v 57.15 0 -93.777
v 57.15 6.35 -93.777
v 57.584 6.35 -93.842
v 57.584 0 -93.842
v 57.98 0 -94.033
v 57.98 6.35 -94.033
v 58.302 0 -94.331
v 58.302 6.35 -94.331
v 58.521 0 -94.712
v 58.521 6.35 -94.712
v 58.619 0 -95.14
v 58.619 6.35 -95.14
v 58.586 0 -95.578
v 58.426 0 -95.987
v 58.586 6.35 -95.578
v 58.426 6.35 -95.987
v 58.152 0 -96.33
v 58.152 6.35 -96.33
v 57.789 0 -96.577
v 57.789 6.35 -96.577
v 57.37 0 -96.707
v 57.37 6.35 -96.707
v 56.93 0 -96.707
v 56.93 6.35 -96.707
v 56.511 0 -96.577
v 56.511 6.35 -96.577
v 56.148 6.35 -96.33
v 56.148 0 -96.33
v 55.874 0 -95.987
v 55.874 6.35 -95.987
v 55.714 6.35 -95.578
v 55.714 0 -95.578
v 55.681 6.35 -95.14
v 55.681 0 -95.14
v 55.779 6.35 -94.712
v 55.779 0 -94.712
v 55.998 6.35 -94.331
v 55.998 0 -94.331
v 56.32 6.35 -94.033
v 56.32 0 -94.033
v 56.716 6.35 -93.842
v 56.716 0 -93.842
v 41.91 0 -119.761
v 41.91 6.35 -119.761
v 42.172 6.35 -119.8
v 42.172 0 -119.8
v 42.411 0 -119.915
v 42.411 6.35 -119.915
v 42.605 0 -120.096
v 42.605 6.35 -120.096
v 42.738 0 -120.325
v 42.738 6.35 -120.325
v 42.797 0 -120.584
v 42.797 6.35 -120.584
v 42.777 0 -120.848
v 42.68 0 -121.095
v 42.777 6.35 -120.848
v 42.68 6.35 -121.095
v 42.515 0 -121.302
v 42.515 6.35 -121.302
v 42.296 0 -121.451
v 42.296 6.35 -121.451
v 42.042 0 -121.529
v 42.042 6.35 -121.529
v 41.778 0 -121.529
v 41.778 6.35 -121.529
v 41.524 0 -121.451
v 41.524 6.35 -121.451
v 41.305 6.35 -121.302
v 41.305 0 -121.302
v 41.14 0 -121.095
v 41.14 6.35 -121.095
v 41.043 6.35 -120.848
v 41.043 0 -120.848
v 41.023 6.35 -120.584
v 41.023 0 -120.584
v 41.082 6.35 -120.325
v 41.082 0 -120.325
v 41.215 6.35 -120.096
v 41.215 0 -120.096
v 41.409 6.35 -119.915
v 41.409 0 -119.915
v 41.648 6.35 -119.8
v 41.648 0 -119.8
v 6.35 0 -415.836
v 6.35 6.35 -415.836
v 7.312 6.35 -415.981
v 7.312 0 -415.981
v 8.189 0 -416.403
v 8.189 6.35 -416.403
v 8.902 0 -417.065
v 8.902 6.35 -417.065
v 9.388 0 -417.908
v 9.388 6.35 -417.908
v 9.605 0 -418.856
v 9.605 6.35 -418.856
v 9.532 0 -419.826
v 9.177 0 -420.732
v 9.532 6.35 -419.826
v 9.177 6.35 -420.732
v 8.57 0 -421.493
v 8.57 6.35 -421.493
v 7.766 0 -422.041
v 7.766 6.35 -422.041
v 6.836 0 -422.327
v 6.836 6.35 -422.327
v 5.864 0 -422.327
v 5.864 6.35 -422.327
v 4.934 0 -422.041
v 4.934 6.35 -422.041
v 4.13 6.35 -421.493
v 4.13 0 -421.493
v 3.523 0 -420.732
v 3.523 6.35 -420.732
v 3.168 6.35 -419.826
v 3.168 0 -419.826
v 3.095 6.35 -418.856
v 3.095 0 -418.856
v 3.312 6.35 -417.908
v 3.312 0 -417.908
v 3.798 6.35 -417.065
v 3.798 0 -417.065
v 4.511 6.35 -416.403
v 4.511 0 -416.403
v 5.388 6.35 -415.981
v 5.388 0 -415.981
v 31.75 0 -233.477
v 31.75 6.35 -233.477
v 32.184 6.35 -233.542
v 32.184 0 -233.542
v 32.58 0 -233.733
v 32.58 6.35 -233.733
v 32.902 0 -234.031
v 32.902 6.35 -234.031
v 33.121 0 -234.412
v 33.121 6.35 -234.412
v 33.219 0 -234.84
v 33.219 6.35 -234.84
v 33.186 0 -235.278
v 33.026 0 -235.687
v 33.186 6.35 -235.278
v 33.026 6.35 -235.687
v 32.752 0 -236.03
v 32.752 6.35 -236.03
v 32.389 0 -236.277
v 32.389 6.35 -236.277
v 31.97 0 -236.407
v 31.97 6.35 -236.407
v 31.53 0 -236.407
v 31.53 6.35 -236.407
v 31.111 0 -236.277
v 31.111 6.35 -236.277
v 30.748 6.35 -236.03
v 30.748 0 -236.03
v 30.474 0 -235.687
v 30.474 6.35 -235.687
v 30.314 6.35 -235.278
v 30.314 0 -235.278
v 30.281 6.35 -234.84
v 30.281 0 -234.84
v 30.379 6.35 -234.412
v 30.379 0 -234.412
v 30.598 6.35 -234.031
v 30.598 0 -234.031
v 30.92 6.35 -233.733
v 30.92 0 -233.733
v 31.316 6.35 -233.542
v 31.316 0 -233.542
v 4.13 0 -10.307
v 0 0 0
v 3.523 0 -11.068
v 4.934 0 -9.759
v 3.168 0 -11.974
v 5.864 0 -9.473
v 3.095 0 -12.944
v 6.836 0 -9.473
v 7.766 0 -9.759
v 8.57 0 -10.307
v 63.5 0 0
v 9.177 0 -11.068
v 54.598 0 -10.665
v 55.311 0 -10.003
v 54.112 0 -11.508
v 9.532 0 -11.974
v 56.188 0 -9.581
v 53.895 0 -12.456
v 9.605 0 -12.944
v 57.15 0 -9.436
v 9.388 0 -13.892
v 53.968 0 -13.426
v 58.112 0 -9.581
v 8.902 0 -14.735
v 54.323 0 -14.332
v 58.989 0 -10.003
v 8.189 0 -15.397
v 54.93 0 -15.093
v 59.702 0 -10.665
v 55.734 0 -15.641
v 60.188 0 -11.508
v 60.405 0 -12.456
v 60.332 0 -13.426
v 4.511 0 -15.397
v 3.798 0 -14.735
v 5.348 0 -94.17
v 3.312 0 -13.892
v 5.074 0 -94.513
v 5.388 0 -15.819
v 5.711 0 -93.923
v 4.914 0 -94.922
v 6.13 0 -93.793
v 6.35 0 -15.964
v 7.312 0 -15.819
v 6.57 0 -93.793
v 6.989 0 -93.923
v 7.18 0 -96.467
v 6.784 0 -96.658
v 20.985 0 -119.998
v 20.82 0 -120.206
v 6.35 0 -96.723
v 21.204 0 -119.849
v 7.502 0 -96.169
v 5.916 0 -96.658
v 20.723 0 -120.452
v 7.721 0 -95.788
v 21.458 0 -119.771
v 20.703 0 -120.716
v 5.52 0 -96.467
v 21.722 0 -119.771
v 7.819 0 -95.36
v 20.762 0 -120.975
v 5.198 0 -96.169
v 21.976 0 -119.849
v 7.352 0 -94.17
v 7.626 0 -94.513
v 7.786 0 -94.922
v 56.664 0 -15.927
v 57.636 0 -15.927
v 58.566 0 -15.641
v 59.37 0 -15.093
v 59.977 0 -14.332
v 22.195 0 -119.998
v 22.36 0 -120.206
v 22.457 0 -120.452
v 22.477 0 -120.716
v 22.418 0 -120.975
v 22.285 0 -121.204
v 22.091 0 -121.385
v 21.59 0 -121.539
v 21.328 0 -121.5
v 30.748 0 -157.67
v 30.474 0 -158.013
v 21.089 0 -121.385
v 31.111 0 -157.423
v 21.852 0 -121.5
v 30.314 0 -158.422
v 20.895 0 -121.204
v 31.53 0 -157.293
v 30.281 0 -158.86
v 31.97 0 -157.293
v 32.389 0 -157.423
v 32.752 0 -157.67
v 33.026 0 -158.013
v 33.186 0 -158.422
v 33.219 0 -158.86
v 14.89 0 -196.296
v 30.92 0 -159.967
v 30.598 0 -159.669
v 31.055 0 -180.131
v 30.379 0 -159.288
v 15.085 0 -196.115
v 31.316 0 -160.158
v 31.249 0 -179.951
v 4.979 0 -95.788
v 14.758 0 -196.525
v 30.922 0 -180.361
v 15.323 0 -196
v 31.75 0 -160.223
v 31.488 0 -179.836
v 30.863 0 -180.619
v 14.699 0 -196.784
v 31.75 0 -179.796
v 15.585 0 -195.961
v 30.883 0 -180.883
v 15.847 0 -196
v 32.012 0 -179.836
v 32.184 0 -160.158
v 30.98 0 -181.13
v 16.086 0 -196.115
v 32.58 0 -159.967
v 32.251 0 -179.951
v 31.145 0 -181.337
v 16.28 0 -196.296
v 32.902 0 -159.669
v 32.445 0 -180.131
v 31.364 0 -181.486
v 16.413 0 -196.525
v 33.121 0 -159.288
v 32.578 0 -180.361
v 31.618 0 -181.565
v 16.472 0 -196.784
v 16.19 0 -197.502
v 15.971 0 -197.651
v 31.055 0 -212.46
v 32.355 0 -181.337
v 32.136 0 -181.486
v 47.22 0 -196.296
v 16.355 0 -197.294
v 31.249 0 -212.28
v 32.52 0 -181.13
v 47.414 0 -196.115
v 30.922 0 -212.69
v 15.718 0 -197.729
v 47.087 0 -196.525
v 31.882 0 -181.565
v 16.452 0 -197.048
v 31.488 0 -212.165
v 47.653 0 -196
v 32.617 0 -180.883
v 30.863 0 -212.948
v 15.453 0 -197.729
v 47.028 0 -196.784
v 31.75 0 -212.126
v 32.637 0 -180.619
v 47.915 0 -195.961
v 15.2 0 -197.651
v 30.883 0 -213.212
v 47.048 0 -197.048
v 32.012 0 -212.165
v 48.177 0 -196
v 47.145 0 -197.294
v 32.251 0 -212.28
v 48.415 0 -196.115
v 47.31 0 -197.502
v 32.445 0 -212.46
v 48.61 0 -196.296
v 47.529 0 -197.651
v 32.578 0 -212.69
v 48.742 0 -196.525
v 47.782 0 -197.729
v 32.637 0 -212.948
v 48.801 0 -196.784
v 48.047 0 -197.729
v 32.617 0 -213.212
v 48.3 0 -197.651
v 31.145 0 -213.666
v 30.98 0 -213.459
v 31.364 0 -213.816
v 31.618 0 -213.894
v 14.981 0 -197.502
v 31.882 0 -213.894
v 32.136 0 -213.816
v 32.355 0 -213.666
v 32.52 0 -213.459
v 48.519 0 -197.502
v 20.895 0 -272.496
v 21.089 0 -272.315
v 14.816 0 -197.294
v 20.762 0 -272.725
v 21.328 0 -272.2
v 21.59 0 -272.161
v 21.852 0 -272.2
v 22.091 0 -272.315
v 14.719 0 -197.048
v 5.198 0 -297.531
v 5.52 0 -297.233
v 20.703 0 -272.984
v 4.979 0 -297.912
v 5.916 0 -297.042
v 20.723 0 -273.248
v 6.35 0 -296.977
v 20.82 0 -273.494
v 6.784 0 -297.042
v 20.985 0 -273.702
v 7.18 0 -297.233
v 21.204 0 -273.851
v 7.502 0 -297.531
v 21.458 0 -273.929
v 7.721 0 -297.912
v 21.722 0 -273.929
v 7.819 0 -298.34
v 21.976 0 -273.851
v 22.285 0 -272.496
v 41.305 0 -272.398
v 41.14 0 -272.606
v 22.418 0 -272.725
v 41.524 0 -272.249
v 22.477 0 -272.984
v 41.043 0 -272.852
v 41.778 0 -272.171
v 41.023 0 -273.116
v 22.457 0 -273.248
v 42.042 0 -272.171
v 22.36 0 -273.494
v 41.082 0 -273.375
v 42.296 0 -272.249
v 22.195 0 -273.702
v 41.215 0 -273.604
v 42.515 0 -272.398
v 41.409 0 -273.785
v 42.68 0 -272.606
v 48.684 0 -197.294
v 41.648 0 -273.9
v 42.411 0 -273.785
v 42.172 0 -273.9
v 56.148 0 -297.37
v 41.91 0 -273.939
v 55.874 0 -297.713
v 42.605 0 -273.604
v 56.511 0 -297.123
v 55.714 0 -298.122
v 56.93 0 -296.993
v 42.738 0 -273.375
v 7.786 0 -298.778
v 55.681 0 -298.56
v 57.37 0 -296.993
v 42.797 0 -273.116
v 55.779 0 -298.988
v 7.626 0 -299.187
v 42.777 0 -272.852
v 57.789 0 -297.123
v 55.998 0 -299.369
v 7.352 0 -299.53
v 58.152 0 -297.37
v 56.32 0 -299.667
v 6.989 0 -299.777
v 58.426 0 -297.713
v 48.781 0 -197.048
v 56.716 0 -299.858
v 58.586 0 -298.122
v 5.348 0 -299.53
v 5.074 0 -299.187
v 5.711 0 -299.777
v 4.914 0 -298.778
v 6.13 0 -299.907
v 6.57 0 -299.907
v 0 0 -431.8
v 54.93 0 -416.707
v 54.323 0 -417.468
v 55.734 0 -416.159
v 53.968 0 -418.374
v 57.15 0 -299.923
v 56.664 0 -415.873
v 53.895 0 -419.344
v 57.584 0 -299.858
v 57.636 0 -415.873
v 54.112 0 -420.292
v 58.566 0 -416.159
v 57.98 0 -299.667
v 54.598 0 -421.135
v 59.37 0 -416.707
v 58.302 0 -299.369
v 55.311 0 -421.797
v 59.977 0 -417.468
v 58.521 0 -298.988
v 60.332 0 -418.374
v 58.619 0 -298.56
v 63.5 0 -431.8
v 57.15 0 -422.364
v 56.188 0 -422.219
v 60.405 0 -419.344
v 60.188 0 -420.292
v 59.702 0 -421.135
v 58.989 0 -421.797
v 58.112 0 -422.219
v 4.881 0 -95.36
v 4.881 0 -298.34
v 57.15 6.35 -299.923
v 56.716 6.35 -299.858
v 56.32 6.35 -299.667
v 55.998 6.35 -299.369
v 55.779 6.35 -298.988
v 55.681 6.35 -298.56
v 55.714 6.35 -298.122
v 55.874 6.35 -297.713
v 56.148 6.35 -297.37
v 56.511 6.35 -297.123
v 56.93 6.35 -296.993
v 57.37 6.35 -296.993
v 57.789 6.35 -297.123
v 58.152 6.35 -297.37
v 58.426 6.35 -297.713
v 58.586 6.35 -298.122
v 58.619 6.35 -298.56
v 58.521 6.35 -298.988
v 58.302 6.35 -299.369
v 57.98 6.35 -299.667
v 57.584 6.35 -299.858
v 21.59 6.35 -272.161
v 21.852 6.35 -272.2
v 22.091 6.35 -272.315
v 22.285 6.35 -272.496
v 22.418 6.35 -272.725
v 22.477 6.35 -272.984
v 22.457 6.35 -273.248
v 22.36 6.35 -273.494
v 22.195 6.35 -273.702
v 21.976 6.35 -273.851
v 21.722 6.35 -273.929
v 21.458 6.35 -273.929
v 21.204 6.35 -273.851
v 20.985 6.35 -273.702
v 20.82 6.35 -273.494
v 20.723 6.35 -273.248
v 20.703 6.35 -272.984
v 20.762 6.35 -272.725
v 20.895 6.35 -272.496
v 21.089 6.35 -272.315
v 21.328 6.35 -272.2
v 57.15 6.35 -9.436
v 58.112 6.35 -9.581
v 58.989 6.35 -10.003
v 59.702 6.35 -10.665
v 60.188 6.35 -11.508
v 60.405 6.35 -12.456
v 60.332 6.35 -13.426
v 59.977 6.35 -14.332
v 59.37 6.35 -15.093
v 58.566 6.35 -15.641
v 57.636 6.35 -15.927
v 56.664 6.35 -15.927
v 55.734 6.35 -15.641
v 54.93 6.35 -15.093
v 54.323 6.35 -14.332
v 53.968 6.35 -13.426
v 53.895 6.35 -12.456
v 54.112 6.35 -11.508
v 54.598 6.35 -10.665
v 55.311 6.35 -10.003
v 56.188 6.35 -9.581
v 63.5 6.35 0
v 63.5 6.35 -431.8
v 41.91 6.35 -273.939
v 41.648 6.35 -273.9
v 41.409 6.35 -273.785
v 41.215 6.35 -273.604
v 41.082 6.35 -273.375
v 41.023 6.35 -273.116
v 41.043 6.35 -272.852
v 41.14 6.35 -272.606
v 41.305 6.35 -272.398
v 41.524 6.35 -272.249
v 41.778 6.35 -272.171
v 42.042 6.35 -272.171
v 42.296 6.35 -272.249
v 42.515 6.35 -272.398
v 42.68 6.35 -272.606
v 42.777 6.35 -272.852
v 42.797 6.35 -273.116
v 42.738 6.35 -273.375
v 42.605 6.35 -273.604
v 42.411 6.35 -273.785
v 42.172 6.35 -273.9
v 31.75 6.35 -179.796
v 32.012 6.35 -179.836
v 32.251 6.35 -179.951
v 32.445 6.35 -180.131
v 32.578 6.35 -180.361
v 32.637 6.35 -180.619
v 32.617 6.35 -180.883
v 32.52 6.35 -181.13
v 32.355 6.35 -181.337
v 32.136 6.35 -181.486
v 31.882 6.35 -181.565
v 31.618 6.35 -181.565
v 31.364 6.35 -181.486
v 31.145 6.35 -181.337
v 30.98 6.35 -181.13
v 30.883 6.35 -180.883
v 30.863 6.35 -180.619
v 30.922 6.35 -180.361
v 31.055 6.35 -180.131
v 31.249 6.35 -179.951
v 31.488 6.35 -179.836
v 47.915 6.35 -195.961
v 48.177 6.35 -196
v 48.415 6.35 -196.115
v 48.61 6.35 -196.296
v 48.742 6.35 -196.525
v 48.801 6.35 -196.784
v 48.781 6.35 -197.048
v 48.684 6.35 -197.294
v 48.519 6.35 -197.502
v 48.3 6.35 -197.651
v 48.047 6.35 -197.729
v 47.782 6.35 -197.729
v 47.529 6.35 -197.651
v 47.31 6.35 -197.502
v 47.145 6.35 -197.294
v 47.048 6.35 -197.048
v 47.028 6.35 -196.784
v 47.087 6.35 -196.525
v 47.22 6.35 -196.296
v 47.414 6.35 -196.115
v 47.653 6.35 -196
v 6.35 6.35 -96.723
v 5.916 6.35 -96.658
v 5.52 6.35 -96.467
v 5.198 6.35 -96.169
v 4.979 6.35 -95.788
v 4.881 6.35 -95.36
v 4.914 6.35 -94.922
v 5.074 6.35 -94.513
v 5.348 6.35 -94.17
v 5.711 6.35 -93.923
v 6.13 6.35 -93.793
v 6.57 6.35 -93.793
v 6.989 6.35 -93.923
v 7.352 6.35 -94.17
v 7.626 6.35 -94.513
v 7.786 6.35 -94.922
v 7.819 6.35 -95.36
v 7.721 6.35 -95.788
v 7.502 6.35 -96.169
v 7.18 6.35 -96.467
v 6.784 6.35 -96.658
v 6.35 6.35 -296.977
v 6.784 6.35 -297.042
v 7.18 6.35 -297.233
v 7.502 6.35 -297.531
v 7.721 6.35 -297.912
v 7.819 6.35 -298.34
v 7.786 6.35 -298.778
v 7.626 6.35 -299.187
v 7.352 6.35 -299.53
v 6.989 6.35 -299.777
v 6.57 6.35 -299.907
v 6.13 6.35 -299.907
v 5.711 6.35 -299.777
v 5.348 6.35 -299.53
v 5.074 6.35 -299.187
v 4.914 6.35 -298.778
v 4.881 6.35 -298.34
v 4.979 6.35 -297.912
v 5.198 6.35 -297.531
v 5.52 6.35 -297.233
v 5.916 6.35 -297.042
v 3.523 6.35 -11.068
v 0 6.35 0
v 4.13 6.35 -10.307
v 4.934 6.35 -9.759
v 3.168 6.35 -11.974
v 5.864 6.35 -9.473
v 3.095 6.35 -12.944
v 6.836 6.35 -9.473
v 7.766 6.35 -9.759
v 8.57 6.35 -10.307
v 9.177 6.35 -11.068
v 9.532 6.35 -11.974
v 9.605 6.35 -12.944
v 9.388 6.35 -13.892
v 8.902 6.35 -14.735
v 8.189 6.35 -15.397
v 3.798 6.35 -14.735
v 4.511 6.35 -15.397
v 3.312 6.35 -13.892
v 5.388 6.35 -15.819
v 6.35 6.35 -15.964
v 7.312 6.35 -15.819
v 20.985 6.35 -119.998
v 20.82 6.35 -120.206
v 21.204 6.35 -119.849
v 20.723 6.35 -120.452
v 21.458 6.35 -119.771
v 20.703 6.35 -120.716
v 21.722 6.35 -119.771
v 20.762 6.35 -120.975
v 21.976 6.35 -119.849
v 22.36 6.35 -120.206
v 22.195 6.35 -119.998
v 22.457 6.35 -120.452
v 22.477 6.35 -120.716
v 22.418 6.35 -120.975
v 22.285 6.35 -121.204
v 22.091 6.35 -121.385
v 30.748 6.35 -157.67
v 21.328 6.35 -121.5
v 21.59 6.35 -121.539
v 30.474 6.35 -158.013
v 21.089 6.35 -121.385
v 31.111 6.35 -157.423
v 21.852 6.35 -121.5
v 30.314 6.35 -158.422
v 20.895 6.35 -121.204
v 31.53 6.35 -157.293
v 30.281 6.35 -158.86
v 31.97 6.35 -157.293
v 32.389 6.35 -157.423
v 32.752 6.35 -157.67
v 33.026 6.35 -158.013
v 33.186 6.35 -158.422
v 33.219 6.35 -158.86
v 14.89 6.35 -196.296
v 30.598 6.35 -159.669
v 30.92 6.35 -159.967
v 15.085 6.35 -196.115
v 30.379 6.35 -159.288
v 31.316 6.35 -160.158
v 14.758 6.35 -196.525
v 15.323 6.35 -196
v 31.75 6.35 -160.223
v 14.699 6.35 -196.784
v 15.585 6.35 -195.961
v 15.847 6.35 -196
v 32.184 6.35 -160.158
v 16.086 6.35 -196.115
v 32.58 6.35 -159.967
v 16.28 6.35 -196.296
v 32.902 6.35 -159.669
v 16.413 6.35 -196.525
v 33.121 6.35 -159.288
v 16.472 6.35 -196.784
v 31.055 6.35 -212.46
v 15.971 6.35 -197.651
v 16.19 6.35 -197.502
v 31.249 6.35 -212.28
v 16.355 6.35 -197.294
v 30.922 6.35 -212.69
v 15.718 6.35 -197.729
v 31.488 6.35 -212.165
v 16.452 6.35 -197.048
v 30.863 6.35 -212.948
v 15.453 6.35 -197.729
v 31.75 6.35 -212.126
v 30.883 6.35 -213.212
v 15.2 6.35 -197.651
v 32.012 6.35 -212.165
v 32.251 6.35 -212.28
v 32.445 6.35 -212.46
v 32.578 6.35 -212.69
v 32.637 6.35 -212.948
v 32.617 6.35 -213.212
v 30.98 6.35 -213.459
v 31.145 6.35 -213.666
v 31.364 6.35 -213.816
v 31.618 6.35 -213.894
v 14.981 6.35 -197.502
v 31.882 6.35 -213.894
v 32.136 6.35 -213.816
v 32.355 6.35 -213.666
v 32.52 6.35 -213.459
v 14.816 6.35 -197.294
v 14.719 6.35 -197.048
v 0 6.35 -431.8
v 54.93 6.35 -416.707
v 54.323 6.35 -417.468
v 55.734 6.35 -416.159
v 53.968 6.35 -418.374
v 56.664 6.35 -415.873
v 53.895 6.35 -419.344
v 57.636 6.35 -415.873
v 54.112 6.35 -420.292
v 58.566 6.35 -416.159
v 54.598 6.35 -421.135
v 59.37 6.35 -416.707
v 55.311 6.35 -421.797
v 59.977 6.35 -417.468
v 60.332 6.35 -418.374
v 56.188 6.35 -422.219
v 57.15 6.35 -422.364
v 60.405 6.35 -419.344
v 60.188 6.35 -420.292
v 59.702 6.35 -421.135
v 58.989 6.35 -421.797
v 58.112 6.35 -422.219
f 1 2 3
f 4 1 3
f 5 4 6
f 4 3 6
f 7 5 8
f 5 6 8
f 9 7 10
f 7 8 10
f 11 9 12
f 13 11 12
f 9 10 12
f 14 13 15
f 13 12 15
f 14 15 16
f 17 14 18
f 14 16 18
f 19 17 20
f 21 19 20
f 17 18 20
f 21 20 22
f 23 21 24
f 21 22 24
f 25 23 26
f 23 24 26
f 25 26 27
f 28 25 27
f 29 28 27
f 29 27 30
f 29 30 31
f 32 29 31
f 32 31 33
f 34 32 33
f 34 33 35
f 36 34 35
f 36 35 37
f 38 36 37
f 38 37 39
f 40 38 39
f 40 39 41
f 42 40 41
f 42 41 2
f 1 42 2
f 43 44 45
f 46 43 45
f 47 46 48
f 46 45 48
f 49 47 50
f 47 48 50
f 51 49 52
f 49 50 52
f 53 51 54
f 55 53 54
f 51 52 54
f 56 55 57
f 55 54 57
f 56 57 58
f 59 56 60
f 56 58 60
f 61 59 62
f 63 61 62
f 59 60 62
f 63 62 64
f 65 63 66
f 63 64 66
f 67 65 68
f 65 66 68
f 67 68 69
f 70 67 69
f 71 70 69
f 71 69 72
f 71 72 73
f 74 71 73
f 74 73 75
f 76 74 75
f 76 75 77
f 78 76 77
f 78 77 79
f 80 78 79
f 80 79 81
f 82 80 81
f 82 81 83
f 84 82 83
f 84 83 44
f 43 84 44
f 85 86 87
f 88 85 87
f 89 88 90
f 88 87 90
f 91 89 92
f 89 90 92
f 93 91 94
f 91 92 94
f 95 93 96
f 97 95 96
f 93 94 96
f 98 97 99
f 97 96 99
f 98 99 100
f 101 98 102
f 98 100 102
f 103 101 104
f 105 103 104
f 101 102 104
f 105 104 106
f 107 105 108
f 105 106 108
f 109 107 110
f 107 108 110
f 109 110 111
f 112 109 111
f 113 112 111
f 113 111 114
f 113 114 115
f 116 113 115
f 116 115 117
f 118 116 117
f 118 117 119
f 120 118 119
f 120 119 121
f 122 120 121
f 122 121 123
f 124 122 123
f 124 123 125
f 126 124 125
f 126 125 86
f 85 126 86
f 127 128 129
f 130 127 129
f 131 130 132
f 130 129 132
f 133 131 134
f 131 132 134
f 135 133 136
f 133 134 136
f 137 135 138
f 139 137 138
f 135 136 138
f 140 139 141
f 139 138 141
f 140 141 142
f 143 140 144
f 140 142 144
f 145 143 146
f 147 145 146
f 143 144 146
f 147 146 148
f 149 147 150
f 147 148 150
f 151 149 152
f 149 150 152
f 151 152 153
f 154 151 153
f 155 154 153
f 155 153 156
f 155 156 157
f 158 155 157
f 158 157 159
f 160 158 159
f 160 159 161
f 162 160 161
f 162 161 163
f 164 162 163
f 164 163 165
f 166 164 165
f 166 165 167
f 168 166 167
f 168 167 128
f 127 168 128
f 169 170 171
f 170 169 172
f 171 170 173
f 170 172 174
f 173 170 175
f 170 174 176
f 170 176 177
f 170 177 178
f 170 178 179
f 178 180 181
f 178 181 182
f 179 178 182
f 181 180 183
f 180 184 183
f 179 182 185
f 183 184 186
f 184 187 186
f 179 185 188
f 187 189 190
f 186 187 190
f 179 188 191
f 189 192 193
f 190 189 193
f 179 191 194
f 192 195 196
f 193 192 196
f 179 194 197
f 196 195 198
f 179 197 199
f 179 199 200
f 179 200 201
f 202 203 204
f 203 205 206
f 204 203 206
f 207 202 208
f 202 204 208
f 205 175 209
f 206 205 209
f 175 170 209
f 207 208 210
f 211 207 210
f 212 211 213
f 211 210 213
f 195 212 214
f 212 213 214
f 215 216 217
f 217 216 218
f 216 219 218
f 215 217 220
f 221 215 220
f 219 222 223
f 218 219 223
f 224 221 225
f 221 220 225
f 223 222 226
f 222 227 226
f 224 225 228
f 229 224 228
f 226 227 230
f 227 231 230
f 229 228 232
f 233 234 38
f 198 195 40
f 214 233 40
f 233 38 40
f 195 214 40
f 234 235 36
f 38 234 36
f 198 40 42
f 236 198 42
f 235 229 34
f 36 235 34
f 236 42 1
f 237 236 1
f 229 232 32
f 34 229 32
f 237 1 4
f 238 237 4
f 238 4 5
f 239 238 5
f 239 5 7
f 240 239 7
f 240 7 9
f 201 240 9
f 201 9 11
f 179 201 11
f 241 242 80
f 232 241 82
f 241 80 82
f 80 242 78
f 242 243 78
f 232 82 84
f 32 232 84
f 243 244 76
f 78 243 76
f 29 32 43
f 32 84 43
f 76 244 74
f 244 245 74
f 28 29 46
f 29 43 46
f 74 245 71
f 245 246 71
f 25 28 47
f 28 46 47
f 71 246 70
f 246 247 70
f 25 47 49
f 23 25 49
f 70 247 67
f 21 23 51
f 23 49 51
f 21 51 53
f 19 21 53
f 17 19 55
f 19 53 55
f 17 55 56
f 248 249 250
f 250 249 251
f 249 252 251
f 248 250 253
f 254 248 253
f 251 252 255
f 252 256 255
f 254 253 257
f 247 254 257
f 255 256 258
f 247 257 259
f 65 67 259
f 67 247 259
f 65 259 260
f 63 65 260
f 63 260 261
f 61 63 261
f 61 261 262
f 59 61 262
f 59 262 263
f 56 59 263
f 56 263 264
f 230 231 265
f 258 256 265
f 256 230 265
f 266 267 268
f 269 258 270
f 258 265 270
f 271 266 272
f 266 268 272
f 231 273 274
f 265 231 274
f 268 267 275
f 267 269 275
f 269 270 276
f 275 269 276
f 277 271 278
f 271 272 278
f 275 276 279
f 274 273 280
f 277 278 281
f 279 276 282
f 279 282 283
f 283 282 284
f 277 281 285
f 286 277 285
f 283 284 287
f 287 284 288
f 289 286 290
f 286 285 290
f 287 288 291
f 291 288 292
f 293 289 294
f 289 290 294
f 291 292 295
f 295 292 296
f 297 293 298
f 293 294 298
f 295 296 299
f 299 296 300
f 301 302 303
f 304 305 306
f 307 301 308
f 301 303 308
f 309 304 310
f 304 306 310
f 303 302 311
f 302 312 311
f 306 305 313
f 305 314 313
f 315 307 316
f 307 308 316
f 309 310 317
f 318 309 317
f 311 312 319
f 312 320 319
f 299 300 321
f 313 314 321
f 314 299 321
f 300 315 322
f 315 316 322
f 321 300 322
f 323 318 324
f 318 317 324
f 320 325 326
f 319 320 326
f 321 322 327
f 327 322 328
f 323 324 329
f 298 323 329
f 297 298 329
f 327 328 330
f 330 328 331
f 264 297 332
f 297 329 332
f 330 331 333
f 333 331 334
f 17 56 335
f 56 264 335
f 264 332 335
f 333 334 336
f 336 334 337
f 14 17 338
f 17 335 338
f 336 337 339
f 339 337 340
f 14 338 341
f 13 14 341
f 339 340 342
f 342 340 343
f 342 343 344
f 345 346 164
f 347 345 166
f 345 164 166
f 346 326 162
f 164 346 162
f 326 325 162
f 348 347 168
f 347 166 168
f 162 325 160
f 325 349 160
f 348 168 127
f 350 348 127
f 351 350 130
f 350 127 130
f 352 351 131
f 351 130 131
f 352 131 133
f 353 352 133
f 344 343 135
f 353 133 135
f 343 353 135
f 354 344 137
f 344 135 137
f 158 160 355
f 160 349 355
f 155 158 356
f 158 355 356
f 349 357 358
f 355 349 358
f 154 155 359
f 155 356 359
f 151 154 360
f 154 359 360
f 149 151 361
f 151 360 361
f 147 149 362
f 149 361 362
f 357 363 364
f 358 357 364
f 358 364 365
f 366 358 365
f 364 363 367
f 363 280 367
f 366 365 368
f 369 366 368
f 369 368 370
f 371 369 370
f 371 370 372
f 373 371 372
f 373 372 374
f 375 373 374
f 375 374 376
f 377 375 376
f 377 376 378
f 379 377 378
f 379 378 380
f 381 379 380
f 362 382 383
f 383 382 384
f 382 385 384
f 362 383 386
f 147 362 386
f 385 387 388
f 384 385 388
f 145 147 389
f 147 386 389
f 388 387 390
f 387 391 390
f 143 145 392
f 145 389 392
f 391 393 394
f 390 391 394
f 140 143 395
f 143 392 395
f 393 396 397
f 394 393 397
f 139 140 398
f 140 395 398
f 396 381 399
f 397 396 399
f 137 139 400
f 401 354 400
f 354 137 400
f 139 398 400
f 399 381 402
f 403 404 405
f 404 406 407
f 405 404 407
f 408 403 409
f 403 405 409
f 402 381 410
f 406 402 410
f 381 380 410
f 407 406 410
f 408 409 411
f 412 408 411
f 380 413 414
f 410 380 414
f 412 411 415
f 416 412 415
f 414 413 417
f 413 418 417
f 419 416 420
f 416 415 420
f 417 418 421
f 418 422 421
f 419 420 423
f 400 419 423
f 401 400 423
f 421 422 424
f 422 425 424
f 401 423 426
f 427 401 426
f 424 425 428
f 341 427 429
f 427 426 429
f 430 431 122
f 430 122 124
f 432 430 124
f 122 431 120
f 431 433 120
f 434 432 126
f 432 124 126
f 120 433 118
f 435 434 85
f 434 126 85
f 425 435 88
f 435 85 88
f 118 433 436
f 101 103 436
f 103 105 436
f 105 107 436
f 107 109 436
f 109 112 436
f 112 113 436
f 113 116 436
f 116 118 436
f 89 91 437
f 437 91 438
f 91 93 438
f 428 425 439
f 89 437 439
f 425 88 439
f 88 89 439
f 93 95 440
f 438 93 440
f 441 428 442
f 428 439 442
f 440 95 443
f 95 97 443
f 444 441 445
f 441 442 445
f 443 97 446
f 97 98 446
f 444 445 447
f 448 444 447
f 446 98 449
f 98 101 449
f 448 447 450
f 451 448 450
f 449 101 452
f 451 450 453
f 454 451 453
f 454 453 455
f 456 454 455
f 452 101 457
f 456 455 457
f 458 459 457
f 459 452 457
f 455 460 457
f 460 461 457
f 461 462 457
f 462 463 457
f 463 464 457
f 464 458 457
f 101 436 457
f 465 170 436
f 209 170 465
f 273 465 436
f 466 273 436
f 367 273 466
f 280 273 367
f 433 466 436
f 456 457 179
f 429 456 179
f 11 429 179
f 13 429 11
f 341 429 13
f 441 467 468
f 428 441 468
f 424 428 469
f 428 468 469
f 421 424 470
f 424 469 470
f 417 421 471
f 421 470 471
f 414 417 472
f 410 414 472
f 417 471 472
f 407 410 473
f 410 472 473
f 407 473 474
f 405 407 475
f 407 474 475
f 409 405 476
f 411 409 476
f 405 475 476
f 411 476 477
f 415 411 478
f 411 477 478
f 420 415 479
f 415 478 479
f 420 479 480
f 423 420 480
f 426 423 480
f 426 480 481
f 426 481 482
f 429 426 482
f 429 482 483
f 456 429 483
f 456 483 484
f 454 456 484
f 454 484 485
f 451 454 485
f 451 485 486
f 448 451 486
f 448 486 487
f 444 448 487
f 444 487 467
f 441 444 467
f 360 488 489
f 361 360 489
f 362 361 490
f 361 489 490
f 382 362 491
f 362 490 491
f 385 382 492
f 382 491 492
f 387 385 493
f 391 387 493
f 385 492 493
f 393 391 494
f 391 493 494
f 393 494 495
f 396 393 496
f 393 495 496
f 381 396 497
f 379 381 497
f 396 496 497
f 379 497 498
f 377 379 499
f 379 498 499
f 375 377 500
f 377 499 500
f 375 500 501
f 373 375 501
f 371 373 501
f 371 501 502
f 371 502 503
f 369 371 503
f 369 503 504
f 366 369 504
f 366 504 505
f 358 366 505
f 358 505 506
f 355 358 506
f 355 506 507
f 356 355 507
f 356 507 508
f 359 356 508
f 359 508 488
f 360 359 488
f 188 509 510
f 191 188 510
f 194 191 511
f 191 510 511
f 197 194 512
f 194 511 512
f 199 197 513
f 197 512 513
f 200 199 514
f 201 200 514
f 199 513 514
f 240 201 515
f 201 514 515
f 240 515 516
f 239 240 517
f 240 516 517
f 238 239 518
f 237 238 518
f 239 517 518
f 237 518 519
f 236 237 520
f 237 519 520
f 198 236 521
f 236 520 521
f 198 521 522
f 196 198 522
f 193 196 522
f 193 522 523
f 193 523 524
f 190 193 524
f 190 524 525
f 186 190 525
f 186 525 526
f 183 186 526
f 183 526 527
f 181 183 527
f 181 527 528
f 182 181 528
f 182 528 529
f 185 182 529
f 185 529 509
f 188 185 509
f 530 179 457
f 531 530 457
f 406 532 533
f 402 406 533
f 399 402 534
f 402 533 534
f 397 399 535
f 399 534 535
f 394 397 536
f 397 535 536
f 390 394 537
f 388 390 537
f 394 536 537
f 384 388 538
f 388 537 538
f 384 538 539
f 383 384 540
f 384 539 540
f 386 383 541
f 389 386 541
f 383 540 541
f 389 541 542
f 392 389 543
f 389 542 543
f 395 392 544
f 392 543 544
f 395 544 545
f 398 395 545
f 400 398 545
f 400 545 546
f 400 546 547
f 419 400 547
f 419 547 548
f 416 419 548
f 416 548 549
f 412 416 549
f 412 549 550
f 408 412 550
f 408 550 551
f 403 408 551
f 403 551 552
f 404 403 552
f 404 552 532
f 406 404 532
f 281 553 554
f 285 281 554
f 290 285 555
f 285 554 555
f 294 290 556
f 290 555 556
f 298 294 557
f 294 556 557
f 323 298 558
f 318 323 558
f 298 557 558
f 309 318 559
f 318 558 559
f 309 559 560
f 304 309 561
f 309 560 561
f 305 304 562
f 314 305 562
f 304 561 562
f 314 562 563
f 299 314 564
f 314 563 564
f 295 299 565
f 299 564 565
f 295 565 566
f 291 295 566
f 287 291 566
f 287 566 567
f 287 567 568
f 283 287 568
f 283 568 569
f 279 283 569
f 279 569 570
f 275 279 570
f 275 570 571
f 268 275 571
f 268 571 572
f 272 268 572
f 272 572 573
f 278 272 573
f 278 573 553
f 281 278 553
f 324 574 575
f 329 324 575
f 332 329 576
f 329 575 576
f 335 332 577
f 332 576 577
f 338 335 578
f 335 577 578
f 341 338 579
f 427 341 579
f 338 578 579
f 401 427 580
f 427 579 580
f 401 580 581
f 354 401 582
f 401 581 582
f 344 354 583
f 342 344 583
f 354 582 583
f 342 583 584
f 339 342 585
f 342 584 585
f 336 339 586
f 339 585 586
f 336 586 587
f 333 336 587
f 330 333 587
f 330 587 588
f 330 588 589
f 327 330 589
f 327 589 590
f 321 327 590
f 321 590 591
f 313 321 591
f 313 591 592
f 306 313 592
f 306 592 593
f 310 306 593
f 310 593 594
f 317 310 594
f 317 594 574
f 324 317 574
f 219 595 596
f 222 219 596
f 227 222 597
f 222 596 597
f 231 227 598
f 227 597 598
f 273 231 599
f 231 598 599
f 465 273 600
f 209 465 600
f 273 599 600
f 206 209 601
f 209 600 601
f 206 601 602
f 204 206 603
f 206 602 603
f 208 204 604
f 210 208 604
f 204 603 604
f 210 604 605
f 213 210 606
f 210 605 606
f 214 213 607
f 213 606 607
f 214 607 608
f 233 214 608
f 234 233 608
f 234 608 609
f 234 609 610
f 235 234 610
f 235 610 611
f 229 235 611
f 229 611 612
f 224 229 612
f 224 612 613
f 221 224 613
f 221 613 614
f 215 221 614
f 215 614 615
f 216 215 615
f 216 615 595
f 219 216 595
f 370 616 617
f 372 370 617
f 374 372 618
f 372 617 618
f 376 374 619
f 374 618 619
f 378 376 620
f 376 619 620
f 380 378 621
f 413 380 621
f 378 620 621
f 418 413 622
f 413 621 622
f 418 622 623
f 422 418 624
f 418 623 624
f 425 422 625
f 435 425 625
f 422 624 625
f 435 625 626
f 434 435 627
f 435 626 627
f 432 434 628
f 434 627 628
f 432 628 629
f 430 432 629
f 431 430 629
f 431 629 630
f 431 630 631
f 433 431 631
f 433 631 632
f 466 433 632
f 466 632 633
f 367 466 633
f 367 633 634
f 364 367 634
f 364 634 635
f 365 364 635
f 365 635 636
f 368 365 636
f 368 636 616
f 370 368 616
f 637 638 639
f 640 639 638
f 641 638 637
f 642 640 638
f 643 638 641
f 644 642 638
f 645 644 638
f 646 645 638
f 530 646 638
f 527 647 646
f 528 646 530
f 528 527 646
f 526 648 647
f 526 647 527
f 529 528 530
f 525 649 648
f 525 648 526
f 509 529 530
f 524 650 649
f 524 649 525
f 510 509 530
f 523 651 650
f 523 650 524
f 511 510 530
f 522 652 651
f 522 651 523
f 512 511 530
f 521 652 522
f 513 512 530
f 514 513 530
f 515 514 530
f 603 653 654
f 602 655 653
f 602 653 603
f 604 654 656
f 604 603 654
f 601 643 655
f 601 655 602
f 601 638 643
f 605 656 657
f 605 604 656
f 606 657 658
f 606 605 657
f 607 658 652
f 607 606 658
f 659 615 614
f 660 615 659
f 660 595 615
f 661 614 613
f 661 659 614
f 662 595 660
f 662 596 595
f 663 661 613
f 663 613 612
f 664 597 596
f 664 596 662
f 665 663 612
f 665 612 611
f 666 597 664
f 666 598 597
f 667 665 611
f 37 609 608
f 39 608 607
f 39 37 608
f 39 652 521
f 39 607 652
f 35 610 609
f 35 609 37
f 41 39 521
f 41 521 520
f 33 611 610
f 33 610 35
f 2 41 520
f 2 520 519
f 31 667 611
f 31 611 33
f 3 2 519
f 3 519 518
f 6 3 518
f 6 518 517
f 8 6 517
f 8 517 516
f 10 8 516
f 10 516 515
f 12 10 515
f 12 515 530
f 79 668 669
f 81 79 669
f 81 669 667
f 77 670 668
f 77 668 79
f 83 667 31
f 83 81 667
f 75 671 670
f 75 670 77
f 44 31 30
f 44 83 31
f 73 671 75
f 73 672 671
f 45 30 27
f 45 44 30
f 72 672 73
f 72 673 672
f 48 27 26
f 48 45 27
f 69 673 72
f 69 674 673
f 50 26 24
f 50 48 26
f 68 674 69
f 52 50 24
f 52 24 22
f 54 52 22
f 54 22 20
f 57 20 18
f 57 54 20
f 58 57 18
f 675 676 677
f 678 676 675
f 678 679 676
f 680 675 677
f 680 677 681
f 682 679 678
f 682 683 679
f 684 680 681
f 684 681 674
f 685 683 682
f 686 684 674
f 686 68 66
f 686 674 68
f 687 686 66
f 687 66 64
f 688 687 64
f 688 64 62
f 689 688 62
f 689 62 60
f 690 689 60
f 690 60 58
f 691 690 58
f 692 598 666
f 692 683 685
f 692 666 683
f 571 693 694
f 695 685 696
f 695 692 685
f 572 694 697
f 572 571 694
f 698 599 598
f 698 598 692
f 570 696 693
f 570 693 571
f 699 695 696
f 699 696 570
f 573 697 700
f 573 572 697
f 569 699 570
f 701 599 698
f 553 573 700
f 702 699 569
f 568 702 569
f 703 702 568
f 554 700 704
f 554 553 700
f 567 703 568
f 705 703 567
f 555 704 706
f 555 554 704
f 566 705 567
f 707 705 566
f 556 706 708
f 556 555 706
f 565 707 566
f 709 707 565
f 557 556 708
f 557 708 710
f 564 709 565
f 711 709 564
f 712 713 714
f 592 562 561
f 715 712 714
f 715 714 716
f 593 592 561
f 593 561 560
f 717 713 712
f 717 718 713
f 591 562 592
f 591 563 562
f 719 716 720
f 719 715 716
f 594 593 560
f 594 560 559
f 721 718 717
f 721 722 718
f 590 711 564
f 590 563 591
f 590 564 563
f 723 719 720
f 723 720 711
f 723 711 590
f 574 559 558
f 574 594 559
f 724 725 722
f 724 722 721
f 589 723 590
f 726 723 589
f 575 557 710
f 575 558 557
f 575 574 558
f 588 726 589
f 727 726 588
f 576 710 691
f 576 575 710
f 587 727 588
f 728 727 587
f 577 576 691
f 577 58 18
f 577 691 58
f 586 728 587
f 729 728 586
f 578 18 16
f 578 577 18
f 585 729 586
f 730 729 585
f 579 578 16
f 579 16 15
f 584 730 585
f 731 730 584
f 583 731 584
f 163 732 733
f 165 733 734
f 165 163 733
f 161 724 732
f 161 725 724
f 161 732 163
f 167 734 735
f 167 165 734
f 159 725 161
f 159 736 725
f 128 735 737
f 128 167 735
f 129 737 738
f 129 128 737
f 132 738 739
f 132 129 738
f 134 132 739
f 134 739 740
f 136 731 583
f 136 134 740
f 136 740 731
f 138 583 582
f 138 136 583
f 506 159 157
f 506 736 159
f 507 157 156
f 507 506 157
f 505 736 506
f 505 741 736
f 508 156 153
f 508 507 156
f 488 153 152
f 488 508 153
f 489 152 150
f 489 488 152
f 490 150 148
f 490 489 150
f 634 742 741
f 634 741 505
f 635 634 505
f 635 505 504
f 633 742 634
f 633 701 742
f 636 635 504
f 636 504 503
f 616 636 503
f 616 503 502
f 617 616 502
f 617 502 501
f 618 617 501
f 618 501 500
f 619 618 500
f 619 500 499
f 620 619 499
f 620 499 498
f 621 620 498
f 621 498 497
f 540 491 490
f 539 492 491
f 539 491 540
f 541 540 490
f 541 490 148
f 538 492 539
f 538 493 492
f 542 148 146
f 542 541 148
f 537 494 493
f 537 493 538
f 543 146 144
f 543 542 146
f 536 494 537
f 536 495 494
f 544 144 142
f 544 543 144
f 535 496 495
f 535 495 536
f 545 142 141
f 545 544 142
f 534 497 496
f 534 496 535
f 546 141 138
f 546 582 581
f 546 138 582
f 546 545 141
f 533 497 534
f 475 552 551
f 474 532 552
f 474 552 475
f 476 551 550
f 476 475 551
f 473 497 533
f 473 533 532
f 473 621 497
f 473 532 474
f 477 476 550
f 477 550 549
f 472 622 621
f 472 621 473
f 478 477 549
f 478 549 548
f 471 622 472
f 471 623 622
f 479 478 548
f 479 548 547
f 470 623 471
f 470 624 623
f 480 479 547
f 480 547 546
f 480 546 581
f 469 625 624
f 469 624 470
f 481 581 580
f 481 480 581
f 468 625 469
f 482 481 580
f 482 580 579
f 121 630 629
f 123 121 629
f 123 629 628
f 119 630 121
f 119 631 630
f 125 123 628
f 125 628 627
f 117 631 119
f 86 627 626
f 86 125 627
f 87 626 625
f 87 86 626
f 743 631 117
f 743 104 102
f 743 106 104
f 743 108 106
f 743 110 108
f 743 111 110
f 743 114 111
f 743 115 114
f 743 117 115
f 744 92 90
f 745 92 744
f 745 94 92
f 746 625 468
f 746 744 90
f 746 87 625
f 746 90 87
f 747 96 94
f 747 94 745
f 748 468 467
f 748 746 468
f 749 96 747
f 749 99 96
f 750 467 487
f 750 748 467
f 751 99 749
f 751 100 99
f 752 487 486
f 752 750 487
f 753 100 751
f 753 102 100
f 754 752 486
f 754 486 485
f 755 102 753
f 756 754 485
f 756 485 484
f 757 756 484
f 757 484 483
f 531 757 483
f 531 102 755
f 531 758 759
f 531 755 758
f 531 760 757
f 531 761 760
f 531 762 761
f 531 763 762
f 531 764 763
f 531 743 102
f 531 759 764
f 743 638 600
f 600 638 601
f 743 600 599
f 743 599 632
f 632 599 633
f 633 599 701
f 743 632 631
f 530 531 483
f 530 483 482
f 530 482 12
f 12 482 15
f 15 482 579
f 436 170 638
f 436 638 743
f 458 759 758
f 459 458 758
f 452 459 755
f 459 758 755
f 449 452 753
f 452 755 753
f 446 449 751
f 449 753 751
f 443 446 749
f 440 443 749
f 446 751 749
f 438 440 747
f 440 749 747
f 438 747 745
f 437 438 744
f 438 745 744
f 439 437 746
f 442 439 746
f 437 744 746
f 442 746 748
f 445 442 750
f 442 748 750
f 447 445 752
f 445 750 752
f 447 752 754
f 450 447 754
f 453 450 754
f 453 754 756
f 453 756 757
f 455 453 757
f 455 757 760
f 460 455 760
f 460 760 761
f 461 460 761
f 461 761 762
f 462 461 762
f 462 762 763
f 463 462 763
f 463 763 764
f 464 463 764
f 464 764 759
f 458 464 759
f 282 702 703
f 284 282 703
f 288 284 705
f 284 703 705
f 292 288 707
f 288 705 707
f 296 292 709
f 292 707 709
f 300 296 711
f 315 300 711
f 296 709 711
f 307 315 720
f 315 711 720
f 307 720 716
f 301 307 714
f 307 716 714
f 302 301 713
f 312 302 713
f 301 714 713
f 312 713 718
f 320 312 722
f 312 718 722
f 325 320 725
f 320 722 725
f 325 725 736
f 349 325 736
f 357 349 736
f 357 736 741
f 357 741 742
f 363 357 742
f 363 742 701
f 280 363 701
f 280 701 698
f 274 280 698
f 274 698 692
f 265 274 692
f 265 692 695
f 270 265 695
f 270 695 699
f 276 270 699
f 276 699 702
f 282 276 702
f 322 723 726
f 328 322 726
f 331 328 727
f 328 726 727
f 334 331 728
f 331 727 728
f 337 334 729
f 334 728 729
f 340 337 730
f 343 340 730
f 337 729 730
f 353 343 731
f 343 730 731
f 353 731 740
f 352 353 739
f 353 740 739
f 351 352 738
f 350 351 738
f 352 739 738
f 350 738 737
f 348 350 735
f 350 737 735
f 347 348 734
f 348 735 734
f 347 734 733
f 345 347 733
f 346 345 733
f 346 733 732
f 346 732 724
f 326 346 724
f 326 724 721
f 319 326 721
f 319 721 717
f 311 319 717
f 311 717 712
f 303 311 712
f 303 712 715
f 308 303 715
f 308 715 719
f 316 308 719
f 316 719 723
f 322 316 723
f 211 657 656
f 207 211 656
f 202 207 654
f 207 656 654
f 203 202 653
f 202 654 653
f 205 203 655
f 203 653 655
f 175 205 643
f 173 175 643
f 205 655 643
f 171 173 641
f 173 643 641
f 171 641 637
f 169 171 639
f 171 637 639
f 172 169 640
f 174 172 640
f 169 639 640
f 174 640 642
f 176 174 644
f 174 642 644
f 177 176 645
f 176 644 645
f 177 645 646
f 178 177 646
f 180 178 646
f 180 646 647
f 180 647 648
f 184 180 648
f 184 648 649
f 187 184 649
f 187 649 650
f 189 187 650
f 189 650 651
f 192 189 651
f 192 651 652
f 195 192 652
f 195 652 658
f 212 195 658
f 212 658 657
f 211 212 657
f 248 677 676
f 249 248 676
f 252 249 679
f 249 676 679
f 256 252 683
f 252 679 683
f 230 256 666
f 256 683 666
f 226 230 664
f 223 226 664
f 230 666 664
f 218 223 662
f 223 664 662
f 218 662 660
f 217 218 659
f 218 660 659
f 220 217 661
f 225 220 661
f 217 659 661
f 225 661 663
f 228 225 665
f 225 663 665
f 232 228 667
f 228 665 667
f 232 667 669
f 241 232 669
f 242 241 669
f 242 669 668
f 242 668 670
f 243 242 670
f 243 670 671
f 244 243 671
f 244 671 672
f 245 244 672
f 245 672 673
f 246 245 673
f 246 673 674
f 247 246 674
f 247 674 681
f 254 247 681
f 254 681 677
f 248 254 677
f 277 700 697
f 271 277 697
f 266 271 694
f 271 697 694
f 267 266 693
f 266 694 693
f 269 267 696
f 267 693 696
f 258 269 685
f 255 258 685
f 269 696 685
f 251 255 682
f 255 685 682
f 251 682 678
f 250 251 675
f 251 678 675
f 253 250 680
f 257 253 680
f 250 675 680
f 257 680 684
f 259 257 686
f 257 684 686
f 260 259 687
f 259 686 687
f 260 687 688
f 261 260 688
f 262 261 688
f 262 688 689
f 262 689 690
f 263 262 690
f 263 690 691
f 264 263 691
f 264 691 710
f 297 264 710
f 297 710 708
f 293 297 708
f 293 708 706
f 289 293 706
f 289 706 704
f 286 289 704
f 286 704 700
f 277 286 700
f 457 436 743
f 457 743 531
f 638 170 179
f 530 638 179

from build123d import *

# Parameters (mm, degrees)
SKETCH1_W           = 63.5
SKETCH1_H           = 431.8
BOSS_EXTRUDE1_DEPTH = 6.35
SKETCH6_R           = 3.2639
CUT_EXTRUDE9_DEPTH  = 437.490334945
SKETCH7_R           = 1.4732
CUT_EXTRUDE10_DEPTH = 437.490334945
SKETCH8_R           = 0.889
CUT_EXTRUDE11_DEPTH = 437.490334945


with BuildPart() as part:
    # Sketch1 → Boss-Extrude1 (new body)
    with BuildSketch(Plane(origin=(0, 0, 0), x_dir=(1, 0, 0), z_dir=(0, 1, 0))):
        with Locations((31.75, 215.9)):
            Rectangle(SKETCH1_W, SKETCH1_H)
    extrude(amount=BOSS_EXTRUDE1_DEPTH)

    # Sketch6 → Cut-Extrude9 (cut, through all)
    with BuildSketch(Plane(origin=(0, 6.35, 0), x_dir=(1, 0, 0), z_dir=(0, 1, 0))):
        with Locations(Location((6.35, 419.1, 0), (0, 0, 270))):
            Circle(SKETCH6_R)
        with Locations(Location((57.15, 419.1, 0), (0, 0, 90))):
            Circle(SKETCH6_R)
        with Locations(Location((57.15, 12.7, 0), (0, 0, 270))):
            Circle(SKETCH6_R)
        with Locations(Location((6.35, 12.7, 0), (0, 0, 90))):
            Circle(SKETCH6_R)
    extrude(amount=-CUT_EXTRUDE9_DEPTH, mode=Mode.SUBTRACT)

    # Sketch7 → Cut-Extrude10 (cut, through all)
    with BuildSketch(Plane(origin=(0, 6.35, 0), x_dir=(1, 0, 0), z_dir=(0, 1, 0))):
        with Locations(Location((6.35, 298.45, 0), (0, 0, 270))):
            Circle(SKETCH7_R)
        with Locations(Location((57.15, 298.45, 0), (0, 0, 90))):
            Circle(SKETCH7_R)
        with Locations(Location((57.15, 95.25, 0), (0, 0, 270))):
            Circle(SKETCH7_R)
        with Locations(Location((6.35, 95.25, 0), (0, 0, 90))):
            Circle(SKETCH7_R)
        with Locations(Location((31.75, 234.95, 0), (0, 0, 270))):
            Circle(SKETCH7_R)
        with Locations(Location((31.75, 158.75, 0), (0, 0, 90))):
            Circle(SKETCH7_R)
    extrude(amount=-CUT_EXTRUDE10_DEPTH, mode=Mode.SUBTRACT)

    # Sketch8 → Cut-Extrude11 (cut, through all)
    with BuildSketch(Plane(origin=(0, 6.35, 0), x_dir=(1, 0, 0), z_dir=(0, 1, 0))):
        with Locations(Location((15.58544, 196.85, 0), (0, 0, 270))):
            Circle(SKETCH8_R)
        with Locations(Location((31.75, 213.01456, 0), (0, 0, 270))):
            Circle(SKETCH8_R)
        with Locations(Location((47.91456, 196.85, 0), (0, 0, 270))):
            Circle(SKETCH8_R)
        with Locations(Location((31.75, 180.68544, 0), (0, 0, 270))):
            Circle(SKETCH8_R)
        with Locations(Location((21.59, 273.05, 0), (0, 0, 270))):
            Circle(SKETCH8_R)
        with Locations(Location((41.91, 273.05, 0), (0, 0, 90))):
            Circle(SKETCH8_R)
        with Locations(Location((41.91, 120.65, 0), (0, 0, 270))):
            Circle(SKETCH8_R)
        with Locations(Location((21.59, 120.65, 0), (0, 0, 90))):
            Circle(SKETCH8_R)
    extrude(amount=-CUT_EXTRUDE11_DEPTH, mode=Mode.SUBTRACT)


solid = part.part
